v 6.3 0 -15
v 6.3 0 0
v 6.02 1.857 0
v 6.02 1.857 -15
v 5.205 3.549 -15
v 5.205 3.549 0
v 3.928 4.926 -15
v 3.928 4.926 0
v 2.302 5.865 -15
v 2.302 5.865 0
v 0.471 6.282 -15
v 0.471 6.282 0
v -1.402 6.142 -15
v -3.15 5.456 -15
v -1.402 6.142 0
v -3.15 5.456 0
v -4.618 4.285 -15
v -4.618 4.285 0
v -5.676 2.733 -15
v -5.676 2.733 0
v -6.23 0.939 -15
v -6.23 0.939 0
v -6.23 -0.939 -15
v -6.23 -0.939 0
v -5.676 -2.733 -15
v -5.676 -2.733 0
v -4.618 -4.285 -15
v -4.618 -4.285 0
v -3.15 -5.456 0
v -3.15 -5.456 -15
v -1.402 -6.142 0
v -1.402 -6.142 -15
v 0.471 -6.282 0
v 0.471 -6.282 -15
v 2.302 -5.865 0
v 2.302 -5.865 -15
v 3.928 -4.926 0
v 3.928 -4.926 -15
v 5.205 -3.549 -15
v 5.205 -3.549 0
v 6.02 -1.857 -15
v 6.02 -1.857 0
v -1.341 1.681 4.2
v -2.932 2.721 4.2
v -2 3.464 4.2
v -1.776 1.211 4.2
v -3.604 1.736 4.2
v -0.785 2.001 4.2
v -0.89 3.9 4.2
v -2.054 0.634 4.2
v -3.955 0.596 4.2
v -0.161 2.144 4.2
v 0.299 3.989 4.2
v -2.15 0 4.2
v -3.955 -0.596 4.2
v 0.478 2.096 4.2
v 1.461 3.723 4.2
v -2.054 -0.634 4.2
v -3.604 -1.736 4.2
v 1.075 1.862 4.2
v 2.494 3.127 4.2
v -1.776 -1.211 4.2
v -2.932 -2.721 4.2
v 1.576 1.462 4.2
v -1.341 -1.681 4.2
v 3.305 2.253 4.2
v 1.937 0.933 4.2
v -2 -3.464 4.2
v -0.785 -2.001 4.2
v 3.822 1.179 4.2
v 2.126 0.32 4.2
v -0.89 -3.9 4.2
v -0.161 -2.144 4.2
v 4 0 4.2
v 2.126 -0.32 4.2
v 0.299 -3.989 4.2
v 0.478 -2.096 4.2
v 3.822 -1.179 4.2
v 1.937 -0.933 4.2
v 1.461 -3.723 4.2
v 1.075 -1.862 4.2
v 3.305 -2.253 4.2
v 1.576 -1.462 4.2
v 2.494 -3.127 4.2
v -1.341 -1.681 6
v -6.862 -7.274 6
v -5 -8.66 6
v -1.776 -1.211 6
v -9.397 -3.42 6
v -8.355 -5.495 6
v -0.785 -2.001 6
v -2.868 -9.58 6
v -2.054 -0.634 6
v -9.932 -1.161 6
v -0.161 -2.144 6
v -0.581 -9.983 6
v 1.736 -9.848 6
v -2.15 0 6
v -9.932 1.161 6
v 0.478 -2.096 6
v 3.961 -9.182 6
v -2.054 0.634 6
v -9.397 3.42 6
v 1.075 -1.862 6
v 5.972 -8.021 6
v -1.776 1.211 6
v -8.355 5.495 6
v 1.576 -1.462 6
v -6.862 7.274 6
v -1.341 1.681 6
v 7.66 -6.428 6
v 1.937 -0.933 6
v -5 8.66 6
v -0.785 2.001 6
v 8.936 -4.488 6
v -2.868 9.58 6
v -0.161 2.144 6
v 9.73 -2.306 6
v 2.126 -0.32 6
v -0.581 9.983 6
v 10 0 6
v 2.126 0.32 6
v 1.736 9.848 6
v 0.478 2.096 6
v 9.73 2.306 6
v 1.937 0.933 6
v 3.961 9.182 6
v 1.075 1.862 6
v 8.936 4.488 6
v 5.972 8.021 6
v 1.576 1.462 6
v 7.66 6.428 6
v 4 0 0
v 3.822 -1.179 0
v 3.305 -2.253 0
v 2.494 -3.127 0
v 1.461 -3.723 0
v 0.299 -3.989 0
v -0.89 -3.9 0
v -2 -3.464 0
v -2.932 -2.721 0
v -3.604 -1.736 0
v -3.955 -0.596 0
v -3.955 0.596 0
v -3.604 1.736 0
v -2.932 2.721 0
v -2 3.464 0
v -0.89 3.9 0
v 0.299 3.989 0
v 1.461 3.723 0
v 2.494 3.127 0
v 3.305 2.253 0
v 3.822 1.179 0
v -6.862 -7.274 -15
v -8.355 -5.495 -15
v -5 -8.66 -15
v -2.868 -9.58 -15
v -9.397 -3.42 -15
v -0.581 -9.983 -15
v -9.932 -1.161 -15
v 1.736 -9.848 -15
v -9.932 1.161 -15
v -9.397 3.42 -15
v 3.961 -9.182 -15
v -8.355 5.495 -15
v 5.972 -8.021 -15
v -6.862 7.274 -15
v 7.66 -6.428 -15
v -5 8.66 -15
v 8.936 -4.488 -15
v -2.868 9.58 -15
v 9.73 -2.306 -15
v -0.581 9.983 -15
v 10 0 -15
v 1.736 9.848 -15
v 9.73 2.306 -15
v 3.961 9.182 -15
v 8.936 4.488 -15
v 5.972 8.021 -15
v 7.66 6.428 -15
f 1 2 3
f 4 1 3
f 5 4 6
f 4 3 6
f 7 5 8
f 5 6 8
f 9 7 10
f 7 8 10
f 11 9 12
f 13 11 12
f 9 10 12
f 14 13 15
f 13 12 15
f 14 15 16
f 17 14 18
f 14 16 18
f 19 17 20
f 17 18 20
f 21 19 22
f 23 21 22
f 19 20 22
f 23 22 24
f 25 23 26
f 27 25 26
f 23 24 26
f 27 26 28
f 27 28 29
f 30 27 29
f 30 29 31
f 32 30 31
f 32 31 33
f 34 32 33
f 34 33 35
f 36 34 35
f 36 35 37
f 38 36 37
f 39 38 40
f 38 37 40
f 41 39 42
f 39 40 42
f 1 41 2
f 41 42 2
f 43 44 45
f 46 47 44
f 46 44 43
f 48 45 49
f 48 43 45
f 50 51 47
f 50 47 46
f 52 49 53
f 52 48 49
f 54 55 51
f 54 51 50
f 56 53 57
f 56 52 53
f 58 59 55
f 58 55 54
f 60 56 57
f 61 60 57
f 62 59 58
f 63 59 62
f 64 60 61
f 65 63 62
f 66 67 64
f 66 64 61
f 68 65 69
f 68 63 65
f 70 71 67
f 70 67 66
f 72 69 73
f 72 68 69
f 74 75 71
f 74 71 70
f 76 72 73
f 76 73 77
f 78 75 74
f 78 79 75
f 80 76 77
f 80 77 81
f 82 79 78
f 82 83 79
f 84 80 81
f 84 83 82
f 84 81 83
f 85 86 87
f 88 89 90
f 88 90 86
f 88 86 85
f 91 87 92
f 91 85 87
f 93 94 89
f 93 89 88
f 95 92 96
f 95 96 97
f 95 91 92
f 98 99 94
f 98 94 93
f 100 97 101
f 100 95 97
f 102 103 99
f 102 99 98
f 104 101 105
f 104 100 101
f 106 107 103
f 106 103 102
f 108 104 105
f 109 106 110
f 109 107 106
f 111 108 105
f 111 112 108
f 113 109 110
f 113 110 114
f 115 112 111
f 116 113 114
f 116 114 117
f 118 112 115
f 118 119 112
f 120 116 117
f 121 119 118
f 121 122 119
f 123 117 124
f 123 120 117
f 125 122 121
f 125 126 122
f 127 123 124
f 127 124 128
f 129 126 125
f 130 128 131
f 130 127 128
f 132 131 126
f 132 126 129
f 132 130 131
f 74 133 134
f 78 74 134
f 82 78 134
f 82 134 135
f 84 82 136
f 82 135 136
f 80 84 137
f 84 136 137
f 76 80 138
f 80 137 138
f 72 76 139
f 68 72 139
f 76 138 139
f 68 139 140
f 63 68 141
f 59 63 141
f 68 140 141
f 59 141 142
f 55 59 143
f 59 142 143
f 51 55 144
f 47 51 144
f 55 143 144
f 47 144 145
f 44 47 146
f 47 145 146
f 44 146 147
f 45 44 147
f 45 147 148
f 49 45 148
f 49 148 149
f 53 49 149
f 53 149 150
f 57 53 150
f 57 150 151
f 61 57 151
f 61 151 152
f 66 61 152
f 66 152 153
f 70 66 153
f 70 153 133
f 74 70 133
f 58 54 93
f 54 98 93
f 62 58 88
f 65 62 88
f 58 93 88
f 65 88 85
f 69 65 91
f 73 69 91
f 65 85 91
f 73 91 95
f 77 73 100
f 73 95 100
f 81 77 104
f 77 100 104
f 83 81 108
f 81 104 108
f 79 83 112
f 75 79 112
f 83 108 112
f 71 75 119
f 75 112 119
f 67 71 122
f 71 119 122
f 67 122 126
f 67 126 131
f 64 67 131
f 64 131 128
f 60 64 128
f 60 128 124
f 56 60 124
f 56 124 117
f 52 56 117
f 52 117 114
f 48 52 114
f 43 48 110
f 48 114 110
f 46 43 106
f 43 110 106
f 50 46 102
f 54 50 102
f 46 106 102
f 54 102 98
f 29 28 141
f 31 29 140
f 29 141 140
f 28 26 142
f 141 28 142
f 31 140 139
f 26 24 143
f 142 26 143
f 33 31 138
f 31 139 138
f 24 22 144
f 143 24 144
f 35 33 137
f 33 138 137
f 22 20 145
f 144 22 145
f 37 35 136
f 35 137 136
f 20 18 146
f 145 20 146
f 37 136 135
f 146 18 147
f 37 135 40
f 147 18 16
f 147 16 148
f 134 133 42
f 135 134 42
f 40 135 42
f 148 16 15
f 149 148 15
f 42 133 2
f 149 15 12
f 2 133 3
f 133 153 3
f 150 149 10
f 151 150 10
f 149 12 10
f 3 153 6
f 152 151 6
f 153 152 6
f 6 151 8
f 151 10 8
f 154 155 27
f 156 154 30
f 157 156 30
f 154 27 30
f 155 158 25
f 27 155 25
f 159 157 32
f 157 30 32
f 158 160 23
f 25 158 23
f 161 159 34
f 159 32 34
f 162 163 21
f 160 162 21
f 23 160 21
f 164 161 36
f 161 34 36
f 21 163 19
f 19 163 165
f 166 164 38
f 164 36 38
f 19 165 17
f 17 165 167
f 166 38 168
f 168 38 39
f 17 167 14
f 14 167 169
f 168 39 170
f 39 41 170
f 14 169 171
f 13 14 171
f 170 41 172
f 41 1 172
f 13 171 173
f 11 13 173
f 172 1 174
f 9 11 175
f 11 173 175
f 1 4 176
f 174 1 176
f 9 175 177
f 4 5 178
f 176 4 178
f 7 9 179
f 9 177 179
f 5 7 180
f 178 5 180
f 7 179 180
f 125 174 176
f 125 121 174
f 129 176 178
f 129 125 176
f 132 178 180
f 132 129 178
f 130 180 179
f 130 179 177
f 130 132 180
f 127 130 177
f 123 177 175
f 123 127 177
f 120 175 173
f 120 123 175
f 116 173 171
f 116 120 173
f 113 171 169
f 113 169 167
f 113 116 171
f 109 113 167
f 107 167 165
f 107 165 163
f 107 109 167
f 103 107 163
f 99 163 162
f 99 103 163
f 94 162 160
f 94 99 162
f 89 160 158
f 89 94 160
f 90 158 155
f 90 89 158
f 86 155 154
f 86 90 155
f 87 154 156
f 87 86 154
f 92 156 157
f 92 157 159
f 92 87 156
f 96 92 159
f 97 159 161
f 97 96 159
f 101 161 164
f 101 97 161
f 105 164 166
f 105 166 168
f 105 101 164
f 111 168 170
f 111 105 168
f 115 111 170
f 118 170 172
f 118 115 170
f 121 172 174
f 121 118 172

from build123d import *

# Parameters (mm, degrees)
F0_R           = 10
F0_R_2         = 6.3
F1_DEPTH       = 6
F2_DEPTH       = 15
F4_R           = 1
F1_FACE_R      = 10
F7_D           = 4.3
F7_CBORE_D     = 8
F7_CBORE_DEPTH = 4.2
F8_D           = 3.2
F8_DEPTH       = 8
F8_START       = 6
F8_TIP         = 0.9613769904


with BuildPart() as f1:
    # F0 (on Top) → F1 (new body)
    with BuildSketch(Plane.XY):
        Circle(F0_R)
        Circle(F0_R_2, mode=Mode.SUBTRACT)
        Circle(F0_R_2)
    extrude(amount=F1_DEPTH)

    # F0 (on Top) → F2 (join)
    with BuildSketch(Plane.XY):
        Circle(F0_R)
        Circle(F0_R_2, mode=Mode.SUBTRACT)
    extrude(amount=-F2_DEPTH)

    # F7 (through all)
    with Locations(Plane(origin=(0, 0, 0), x_dir=(1, 0, 0), z_dir=(0, 0, -1))):
        with Locations((0, 0)):
            CounterBoreHole(F7_D / 2, F7_CBORE_D / 2, F7_CBORE_DEPTH)


with BuildPart() as f5:
    # F4 (on offset) → F5 section 0
    with BuildSketch(Plane.XY.offset(16)):
        Circle(F4_R)
    # F1_face (on face) → F5 section 1
    with BuildSketch(Plane.XY.offset(6)):
        Circle(F1_FACE_R)
    loft()

    # F8
    # its depths count from where the whole tool has entered the part; down to there all is cleared
    with Locations(Plane(origin=(0, 0, 0), x_dir=(1, 0, 0), z_dir=(0, 0, -1)).offset(-F8_START)):
        with Locations((0, 0)):
            Hole(F8_D / 2, depth=F8_DEPTH)
            with Locations((0, 0, -(F8_DEPTH + F8_TIP / 2))):  # 118° drill point
                Cone(0, F8_D / 2, F8_TIP, mode=Mode.SUBTRACT)


solid = f1.part
